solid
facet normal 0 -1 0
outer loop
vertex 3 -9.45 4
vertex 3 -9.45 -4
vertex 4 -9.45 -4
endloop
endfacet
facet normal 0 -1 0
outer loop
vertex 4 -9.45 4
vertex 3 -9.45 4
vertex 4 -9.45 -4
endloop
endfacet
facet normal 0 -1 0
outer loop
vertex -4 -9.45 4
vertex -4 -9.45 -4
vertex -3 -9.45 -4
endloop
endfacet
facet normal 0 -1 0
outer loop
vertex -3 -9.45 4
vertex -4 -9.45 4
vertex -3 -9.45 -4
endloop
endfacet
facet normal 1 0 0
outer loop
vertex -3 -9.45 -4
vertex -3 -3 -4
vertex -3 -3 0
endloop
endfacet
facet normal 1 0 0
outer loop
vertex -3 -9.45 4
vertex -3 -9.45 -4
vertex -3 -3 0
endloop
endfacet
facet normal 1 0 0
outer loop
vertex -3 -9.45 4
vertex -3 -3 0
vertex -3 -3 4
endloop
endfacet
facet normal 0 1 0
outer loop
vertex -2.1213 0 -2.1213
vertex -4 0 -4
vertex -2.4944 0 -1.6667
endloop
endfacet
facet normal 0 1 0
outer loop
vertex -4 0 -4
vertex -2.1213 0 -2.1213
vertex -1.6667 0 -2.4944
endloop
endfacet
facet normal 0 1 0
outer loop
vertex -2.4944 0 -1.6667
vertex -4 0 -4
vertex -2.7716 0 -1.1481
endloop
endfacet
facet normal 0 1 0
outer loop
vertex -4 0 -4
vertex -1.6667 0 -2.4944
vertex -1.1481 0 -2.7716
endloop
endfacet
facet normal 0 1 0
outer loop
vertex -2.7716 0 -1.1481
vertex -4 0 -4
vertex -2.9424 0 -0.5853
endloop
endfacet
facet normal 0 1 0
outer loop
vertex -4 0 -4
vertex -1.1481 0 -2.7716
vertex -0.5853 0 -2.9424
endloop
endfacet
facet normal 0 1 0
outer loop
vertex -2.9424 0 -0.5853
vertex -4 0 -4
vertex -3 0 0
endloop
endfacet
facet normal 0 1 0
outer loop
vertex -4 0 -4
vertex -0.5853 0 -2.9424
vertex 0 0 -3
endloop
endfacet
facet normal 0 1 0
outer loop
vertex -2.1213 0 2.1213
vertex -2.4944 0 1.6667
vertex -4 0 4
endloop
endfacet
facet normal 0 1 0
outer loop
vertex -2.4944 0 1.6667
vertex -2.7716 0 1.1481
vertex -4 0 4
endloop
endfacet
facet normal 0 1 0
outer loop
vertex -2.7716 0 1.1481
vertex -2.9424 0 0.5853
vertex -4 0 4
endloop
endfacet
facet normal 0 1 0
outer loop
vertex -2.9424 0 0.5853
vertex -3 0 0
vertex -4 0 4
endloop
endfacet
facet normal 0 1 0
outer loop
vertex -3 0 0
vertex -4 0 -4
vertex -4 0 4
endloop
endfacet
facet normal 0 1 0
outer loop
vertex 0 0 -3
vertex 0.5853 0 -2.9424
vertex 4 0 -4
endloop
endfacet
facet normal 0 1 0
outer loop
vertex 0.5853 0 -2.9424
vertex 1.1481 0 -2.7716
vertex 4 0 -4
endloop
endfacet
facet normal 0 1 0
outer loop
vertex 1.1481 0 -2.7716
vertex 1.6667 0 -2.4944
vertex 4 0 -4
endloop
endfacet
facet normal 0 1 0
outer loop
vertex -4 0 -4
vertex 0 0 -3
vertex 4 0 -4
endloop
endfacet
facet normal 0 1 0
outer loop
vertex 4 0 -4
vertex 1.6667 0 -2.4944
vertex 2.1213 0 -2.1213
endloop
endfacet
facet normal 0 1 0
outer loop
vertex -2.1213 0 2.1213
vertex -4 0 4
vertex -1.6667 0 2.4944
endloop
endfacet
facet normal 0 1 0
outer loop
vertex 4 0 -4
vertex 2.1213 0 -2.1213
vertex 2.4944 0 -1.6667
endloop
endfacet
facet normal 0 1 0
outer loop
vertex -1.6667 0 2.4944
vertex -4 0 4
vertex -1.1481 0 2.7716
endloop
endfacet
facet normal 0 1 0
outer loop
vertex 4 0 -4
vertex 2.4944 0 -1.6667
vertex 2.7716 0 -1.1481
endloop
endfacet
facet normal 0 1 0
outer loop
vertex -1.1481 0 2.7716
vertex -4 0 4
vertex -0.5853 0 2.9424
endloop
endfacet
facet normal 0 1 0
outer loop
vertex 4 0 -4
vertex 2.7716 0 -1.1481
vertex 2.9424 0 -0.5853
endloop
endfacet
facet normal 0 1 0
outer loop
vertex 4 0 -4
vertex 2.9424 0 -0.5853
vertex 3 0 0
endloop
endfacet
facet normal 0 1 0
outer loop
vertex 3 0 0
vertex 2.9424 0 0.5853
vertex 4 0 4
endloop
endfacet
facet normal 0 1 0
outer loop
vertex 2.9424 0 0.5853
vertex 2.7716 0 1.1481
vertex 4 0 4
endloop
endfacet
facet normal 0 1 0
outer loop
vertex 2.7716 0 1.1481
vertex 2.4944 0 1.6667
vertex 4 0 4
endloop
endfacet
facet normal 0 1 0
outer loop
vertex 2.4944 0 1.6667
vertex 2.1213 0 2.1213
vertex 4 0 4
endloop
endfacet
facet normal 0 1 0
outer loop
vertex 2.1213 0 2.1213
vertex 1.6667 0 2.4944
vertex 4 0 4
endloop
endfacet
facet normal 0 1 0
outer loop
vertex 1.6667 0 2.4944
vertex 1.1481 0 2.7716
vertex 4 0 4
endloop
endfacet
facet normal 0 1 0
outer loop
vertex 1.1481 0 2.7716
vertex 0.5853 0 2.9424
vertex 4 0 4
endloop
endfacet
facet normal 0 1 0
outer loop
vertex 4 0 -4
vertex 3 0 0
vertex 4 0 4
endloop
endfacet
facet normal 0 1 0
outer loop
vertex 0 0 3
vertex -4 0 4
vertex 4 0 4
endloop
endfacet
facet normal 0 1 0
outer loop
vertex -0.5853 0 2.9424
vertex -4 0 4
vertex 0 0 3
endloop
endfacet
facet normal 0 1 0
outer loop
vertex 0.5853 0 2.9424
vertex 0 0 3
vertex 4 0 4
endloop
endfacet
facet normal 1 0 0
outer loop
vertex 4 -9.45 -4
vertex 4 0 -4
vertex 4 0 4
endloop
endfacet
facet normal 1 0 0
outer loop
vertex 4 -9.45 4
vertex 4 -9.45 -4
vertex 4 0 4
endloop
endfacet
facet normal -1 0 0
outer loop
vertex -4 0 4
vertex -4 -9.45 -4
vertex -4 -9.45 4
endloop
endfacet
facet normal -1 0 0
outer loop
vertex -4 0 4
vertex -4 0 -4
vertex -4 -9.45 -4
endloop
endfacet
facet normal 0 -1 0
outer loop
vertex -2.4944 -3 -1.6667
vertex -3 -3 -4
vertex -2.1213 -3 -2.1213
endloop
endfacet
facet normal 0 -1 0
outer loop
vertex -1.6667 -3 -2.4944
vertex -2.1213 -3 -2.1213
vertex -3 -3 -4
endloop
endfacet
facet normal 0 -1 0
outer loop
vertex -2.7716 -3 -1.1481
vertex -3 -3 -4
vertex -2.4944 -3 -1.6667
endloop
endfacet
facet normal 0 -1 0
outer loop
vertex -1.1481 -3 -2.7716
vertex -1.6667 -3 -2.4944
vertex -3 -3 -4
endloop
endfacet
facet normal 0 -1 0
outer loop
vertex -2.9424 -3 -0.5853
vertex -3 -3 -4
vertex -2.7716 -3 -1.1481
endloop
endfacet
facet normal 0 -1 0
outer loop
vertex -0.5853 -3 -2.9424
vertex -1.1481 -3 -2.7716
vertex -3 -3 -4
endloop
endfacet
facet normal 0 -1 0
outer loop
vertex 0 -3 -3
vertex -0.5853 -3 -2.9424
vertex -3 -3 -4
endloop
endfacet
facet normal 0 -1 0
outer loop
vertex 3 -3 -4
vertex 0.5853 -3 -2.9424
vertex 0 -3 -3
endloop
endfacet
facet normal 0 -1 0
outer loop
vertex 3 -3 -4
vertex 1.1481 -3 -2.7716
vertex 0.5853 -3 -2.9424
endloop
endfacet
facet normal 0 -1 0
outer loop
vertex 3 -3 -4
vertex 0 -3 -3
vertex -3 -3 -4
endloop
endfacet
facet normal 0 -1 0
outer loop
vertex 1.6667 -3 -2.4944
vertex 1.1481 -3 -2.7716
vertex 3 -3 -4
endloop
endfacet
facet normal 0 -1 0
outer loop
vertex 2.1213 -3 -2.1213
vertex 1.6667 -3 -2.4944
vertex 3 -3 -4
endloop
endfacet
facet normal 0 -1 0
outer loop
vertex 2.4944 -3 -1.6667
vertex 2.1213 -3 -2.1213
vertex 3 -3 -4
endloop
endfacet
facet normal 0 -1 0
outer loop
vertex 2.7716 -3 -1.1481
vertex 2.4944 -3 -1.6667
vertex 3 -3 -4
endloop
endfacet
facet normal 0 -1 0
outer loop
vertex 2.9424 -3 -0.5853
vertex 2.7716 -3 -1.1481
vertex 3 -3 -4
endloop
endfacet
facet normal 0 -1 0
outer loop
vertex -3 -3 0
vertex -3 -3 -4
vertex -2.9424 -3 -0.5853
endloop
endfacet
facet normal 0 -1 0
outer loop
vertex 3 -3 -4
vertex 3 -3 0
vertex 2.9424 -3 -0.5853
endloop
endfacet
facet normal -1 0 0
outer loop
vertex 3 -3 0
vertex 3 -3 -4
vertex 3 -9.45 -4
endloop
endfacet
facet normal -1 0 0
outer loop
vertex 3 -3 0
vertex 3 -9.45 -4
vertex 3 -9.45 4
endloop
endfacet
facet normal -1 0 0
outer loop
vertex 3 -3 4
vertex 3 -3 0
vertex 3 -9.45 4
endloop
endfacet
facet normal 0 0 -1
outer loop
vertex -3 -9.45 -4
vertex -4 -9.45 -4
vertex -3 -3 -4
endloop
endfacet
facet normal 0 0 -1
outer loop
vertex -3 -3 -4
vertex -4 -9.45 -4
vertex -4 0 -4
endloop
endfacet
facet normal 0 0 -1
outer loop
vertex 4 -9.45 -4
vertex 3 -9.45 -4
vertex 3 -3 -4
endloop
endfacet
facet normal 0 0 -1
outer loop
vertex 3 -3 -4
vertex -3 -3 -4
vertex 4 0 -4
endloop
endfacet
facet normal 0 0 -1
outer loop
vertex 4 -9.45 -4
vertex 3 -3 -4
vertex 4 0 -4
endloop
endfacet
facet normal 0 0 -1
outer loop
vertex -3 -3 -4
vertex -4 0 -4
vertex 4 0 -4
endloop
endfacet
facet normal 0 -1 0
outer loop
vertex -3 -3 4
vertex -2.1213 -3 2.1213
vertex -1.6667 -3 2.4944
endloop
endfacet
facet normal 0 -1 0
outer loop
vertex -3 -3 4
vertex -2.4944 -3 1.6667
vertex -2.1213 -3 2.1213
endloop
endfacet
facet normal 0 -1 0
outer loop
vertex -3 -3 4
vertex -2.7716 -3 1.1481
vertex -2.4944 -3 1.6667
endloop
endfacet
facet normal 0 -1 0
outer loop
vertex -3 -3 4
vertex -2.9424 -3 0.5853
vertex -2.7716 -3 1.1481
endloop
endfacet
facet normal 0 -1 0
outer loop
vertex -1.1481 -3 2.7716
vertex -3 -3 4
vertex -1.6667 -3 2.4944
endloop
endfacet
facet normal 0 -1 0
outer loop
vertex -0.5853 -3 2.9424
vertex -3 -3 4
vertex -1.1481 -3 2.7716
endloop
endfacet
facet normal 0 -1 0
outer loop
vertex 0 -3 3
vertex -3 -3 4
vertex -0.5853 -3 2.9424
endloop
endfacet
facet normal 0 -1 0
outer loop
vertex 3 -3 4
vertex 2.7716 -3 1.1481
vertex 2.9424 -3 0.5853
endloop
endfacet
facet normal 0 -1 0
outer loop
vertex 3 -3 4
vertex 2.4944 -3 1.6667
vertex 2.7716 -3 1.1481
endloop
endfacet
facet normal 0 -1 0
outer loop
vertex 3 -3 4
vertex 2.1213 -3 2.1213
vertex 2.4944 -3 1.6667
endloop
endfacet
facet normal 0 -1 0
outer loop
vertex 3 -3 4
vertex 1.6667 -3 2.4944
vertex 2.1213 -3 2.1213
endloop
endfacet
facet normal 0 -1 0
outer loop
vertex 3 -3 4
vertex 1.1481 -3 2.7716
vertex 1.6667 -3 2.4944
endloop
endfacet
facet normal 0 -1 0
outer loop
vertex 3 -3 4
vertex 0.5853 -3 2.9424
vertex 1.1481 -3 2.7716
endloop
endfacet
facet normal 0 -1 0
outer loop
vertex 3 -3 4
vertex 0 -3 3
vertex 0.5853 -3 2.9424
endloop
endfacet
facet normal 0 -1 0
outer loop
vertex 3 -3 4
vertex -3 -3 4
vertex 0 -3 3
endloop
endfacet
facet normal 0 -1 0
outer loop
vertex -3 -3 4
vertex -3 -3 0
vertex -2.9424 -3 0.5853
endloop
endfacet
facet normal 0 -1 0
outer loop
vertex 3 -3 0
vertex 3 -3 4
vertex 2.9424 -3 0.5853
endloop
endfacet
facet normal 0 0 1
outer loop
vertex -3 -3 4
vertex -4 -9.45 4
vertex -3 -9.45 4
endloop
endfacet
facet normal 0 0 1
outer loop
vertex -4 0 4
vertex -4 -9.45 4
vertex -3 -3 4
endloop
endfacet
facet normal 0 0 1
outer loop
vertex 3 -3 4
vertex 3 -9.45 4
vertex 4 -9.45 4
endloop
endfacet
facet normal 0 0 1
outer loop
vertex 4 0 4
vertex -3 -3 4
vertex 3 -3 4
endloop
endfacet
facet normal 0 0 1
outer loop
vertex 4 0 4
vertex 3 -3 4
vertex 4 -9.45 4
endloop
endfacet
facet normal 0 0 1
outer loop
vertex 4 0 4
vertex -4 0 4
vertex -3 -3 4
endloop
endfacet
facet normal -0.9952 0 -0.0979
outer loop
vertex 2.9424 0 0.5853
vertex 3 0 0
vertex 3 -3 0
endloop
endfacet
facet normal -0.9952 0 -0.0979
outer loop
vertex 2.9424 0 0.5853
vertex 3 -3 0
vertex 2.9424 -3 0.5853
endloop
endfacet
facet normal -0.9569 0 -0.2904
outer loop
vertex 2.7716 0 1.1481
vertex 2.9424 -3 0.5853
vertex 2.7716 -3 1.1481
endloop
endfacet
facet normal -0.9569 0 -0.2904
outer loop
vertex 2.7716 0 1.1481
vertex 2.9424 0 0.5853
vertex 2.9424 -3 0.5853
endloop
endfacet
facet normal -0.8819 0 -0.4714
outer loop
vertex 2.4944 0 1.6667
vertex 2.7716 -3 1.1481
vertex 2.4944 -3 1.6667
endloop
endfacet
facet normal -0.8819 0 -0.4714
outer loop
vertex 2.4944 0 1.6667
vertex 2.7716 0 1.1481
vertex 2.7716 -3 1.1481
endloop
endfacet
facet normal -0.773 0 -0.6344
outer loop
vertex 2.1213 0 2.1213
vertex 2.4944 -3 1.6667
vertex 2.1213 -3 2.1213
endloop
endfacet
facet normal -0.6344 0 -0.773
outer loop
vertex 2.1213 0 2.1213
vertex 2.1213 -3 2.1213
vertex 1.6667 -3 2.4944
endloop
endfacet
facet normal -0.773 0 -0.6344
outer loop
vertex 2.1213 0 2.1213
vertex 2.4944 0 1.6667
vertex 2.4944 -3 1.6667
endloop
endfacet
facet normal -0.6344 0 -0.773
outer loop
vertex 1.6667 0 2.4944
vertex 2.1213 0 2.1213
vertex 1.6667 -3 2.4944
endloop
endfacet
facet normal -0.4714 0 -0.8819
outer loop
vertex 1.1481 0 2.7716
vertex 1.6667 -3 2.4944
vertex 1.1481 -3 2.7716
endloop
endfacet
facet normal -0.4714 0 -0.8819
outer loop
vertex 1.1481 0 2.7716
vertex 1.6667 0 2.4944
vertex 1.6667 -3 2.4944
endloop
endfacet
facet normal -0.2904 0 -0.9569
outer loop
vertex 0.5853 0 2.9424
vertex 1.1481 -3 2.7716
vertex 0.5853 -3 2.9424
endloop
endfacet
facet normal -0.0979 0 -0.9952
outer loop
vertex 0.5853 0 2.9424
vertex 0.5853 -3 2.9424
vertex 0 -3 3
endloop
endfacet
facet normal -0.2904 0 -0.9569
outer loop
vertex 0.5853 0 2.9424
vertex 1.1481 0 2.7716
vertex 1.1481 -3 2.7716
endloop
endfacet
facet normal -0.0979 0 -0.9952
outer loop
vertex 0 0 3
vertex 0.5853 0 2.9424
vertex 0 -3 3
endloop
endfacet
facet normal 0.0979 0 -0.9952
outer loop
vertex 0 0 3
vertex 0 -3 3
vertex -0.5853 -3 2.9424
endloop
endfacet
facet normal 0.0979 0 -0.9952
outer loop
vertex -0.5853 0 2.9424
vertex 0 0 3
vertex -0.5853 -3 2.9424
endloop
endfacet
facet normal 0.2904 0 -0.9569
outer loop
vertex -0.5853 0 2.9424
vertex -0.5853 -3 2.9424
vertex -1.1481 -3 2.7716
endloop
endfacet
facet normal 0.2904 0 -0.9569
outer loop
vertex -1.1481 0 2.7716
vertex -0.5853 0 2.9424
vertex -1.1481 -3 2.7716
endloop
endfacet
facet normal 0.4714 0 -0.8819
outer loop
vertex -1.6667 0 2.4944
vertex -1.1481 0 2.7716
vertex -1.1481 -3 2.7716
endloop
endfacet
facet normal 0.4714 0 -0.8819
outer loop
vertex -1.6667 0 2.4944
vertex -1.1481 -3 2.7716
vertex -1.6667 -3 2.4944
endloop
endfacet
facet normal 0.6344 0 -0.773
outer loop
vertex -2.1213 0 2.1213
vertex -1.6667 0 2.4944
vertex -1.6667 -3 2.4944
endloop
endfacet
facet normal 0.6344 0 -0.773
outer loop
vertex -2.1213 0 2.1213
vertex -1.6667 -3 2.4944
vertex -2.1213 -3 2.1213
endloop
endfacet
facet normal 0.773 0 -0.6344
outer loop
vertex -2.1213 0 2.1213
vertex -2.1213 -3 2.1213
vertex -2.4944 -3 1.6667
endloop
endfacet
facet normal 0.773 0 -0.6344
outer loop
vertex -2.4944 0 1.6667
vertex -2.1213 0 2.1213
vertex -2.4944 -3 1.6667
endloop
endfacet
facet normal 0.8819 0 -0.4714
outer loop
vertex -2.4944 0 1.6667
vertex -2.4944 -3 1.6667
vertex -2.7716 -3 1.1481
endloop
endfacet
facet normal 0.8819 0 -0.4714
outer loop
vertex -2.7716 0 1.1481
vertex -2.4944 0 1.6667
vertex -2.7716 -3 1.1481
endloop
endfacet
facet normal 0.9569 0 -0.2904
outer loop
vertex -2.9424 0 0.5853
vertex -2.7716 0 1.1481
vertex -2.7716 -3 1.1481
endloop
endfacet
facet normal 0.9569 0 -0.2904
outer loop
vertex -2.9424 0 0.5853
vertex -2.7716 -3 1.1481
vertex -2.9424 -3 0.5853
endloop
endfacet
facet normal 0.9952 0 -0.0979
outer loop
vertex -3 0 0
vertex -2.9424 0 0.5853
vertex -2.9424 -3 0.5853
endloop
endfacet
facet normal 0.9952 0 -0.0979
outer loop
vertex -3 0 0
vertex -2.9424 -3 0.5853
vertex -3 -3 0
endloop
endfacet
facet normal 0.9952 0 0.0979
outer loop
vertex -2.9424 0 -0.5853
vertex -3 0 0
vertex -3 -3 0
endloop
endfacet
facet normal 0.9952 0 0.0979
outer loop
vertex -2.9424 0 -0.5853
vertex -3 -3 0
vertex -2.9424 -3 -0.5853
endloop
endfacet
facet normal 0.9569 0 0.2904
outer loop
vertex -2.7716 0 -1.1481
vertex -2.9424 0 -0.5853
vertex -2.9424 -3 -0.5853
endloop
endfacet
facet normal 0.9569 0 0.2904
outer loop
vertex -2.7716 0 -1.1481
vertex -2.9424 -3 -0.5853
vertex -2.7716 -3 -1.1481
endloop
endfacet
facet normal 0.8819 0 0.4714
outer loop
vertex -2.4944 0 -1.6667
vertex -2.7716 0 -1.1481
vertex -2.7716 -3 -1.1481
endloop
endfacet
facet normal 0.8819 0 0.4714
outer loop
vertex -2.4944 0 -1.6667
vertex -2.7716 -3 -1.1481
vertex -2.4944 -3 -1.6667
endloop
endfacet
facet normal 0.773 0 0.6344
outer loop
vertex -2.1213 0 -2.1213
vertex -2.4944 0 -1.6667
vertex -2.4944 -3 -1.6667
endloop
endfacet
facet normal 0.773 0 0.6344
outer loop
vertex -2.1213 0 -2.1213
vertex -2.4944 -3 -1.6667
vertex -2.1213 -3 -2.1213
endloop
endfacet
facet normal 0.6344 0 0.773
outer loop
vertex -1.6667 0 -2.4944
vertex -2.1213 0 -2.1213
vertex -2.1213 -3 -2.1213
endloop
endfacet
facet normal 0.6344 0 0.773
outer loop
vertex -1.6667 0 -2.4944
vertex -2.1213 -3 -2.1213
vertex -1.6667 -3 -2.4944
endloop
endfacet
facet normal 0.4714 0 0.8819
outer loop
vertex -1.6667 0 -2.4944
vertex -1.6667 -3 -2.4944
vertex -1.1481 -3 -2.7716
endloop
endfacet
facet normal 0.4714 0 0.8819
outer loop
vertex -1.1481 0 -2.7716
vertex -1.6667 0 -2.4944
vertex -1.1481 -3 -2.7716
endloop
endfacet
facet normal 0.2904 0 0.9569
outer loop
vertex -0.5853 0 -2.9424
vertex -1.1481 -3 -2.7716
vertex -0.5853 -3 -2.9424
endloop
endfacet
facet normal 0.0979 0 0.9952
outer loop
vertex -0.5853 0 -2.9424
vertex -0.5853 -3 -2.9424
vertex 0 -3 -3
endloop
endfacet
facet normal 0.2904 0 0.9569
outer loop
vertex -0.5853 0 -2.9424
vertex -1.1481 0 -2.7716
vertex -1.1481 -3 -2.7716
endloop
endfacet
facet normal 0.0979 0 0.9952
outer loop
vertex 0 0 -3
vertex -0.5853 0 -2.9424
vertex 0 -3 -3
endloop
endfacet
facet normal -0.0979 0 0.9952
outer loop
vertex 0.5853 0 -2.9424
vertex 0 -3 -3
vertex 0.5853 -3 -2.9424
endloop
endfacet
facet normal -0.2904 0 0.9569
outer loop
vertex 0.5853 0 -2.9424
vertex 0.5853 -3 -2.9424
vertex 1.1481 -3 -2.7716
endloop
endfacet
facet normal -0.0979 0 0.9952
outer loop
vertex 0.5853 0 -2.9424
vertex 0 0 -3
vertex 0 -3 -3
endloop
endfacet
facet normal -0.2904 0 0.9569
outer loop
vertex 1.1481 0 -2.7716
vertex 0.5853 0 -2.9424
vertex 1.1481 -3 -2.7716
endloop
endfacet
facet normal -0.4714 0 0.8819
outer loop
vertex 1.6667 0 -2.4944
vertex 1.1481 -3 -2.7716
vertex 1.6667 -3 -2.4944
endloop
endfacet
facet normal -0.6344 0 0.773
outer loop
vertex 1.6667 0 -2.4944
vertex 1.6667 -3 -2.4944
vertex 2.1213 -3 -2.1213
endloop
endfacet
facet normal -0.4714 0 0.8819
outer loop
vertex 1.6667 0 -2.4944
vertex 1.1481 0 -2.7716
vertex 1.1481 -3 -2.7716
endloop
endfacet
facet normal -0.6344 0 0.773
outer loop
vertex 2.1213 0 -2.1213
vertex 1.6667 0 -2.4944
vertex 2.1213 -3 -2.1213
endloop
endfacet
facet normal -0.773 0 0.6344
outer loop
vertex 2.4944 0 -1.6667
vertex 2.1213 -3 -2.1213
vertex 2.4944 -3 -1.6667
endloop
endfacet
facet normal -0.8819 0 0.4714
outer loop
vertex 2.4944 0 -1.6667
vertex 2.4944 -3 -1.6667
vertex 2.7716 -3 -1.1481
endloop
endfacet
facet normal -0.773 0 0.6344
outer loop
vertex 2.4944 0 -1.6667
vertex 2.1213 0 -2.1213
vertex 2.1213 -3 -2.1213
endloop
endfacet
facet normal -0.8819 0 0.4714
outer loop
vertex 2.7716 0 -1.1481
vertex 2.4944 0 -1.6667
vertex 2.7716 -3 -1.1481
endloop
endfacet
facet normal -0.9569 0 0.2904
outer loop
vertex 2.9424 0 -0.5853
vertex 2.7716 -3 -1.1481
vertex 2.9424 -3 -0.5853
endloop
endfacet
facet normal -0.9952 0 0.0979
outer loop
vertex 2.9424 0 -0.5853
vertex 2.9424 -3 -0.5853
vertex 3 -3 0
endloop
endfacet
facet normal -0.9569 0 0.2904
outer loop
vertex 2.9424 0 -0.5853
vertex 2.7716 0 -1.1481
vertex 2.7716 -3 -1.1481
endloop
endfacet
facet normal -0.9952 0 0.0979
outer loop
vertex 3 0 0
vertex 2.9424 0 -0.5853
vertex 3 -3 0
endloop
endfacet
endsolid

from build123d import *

# Parameters (mm, degrees)
F0_W     = 8
F0_H     = 8
F0_R     = 3
F1_DEPTH = 3
F2_W     = 1
F2_H     = 8
F3_DEPTH = 6.45


with BuildPart() as f1:
    # F0 (on Front) → F1 (new body)
    with BuildSketch(Plane.XZ):
        Rectangle(F0_W, F0_H)
        Circle(F0_R, mode=Mode.SUBTRACT)
    extrude(amount=F1_DEPTH)

    # F2 (on face) → F3 (join)
    with BuildSketch(Plane.XZ.offset(3)):
        with Locations((-3.5, 0)):
            Rectangle(F2_W, F2_H)
        with Locations((3.5, 0)):
            Rectangle(F2_W, F2_H)
    extrude(amount=F3_DEPTH)


solid = f1.part
